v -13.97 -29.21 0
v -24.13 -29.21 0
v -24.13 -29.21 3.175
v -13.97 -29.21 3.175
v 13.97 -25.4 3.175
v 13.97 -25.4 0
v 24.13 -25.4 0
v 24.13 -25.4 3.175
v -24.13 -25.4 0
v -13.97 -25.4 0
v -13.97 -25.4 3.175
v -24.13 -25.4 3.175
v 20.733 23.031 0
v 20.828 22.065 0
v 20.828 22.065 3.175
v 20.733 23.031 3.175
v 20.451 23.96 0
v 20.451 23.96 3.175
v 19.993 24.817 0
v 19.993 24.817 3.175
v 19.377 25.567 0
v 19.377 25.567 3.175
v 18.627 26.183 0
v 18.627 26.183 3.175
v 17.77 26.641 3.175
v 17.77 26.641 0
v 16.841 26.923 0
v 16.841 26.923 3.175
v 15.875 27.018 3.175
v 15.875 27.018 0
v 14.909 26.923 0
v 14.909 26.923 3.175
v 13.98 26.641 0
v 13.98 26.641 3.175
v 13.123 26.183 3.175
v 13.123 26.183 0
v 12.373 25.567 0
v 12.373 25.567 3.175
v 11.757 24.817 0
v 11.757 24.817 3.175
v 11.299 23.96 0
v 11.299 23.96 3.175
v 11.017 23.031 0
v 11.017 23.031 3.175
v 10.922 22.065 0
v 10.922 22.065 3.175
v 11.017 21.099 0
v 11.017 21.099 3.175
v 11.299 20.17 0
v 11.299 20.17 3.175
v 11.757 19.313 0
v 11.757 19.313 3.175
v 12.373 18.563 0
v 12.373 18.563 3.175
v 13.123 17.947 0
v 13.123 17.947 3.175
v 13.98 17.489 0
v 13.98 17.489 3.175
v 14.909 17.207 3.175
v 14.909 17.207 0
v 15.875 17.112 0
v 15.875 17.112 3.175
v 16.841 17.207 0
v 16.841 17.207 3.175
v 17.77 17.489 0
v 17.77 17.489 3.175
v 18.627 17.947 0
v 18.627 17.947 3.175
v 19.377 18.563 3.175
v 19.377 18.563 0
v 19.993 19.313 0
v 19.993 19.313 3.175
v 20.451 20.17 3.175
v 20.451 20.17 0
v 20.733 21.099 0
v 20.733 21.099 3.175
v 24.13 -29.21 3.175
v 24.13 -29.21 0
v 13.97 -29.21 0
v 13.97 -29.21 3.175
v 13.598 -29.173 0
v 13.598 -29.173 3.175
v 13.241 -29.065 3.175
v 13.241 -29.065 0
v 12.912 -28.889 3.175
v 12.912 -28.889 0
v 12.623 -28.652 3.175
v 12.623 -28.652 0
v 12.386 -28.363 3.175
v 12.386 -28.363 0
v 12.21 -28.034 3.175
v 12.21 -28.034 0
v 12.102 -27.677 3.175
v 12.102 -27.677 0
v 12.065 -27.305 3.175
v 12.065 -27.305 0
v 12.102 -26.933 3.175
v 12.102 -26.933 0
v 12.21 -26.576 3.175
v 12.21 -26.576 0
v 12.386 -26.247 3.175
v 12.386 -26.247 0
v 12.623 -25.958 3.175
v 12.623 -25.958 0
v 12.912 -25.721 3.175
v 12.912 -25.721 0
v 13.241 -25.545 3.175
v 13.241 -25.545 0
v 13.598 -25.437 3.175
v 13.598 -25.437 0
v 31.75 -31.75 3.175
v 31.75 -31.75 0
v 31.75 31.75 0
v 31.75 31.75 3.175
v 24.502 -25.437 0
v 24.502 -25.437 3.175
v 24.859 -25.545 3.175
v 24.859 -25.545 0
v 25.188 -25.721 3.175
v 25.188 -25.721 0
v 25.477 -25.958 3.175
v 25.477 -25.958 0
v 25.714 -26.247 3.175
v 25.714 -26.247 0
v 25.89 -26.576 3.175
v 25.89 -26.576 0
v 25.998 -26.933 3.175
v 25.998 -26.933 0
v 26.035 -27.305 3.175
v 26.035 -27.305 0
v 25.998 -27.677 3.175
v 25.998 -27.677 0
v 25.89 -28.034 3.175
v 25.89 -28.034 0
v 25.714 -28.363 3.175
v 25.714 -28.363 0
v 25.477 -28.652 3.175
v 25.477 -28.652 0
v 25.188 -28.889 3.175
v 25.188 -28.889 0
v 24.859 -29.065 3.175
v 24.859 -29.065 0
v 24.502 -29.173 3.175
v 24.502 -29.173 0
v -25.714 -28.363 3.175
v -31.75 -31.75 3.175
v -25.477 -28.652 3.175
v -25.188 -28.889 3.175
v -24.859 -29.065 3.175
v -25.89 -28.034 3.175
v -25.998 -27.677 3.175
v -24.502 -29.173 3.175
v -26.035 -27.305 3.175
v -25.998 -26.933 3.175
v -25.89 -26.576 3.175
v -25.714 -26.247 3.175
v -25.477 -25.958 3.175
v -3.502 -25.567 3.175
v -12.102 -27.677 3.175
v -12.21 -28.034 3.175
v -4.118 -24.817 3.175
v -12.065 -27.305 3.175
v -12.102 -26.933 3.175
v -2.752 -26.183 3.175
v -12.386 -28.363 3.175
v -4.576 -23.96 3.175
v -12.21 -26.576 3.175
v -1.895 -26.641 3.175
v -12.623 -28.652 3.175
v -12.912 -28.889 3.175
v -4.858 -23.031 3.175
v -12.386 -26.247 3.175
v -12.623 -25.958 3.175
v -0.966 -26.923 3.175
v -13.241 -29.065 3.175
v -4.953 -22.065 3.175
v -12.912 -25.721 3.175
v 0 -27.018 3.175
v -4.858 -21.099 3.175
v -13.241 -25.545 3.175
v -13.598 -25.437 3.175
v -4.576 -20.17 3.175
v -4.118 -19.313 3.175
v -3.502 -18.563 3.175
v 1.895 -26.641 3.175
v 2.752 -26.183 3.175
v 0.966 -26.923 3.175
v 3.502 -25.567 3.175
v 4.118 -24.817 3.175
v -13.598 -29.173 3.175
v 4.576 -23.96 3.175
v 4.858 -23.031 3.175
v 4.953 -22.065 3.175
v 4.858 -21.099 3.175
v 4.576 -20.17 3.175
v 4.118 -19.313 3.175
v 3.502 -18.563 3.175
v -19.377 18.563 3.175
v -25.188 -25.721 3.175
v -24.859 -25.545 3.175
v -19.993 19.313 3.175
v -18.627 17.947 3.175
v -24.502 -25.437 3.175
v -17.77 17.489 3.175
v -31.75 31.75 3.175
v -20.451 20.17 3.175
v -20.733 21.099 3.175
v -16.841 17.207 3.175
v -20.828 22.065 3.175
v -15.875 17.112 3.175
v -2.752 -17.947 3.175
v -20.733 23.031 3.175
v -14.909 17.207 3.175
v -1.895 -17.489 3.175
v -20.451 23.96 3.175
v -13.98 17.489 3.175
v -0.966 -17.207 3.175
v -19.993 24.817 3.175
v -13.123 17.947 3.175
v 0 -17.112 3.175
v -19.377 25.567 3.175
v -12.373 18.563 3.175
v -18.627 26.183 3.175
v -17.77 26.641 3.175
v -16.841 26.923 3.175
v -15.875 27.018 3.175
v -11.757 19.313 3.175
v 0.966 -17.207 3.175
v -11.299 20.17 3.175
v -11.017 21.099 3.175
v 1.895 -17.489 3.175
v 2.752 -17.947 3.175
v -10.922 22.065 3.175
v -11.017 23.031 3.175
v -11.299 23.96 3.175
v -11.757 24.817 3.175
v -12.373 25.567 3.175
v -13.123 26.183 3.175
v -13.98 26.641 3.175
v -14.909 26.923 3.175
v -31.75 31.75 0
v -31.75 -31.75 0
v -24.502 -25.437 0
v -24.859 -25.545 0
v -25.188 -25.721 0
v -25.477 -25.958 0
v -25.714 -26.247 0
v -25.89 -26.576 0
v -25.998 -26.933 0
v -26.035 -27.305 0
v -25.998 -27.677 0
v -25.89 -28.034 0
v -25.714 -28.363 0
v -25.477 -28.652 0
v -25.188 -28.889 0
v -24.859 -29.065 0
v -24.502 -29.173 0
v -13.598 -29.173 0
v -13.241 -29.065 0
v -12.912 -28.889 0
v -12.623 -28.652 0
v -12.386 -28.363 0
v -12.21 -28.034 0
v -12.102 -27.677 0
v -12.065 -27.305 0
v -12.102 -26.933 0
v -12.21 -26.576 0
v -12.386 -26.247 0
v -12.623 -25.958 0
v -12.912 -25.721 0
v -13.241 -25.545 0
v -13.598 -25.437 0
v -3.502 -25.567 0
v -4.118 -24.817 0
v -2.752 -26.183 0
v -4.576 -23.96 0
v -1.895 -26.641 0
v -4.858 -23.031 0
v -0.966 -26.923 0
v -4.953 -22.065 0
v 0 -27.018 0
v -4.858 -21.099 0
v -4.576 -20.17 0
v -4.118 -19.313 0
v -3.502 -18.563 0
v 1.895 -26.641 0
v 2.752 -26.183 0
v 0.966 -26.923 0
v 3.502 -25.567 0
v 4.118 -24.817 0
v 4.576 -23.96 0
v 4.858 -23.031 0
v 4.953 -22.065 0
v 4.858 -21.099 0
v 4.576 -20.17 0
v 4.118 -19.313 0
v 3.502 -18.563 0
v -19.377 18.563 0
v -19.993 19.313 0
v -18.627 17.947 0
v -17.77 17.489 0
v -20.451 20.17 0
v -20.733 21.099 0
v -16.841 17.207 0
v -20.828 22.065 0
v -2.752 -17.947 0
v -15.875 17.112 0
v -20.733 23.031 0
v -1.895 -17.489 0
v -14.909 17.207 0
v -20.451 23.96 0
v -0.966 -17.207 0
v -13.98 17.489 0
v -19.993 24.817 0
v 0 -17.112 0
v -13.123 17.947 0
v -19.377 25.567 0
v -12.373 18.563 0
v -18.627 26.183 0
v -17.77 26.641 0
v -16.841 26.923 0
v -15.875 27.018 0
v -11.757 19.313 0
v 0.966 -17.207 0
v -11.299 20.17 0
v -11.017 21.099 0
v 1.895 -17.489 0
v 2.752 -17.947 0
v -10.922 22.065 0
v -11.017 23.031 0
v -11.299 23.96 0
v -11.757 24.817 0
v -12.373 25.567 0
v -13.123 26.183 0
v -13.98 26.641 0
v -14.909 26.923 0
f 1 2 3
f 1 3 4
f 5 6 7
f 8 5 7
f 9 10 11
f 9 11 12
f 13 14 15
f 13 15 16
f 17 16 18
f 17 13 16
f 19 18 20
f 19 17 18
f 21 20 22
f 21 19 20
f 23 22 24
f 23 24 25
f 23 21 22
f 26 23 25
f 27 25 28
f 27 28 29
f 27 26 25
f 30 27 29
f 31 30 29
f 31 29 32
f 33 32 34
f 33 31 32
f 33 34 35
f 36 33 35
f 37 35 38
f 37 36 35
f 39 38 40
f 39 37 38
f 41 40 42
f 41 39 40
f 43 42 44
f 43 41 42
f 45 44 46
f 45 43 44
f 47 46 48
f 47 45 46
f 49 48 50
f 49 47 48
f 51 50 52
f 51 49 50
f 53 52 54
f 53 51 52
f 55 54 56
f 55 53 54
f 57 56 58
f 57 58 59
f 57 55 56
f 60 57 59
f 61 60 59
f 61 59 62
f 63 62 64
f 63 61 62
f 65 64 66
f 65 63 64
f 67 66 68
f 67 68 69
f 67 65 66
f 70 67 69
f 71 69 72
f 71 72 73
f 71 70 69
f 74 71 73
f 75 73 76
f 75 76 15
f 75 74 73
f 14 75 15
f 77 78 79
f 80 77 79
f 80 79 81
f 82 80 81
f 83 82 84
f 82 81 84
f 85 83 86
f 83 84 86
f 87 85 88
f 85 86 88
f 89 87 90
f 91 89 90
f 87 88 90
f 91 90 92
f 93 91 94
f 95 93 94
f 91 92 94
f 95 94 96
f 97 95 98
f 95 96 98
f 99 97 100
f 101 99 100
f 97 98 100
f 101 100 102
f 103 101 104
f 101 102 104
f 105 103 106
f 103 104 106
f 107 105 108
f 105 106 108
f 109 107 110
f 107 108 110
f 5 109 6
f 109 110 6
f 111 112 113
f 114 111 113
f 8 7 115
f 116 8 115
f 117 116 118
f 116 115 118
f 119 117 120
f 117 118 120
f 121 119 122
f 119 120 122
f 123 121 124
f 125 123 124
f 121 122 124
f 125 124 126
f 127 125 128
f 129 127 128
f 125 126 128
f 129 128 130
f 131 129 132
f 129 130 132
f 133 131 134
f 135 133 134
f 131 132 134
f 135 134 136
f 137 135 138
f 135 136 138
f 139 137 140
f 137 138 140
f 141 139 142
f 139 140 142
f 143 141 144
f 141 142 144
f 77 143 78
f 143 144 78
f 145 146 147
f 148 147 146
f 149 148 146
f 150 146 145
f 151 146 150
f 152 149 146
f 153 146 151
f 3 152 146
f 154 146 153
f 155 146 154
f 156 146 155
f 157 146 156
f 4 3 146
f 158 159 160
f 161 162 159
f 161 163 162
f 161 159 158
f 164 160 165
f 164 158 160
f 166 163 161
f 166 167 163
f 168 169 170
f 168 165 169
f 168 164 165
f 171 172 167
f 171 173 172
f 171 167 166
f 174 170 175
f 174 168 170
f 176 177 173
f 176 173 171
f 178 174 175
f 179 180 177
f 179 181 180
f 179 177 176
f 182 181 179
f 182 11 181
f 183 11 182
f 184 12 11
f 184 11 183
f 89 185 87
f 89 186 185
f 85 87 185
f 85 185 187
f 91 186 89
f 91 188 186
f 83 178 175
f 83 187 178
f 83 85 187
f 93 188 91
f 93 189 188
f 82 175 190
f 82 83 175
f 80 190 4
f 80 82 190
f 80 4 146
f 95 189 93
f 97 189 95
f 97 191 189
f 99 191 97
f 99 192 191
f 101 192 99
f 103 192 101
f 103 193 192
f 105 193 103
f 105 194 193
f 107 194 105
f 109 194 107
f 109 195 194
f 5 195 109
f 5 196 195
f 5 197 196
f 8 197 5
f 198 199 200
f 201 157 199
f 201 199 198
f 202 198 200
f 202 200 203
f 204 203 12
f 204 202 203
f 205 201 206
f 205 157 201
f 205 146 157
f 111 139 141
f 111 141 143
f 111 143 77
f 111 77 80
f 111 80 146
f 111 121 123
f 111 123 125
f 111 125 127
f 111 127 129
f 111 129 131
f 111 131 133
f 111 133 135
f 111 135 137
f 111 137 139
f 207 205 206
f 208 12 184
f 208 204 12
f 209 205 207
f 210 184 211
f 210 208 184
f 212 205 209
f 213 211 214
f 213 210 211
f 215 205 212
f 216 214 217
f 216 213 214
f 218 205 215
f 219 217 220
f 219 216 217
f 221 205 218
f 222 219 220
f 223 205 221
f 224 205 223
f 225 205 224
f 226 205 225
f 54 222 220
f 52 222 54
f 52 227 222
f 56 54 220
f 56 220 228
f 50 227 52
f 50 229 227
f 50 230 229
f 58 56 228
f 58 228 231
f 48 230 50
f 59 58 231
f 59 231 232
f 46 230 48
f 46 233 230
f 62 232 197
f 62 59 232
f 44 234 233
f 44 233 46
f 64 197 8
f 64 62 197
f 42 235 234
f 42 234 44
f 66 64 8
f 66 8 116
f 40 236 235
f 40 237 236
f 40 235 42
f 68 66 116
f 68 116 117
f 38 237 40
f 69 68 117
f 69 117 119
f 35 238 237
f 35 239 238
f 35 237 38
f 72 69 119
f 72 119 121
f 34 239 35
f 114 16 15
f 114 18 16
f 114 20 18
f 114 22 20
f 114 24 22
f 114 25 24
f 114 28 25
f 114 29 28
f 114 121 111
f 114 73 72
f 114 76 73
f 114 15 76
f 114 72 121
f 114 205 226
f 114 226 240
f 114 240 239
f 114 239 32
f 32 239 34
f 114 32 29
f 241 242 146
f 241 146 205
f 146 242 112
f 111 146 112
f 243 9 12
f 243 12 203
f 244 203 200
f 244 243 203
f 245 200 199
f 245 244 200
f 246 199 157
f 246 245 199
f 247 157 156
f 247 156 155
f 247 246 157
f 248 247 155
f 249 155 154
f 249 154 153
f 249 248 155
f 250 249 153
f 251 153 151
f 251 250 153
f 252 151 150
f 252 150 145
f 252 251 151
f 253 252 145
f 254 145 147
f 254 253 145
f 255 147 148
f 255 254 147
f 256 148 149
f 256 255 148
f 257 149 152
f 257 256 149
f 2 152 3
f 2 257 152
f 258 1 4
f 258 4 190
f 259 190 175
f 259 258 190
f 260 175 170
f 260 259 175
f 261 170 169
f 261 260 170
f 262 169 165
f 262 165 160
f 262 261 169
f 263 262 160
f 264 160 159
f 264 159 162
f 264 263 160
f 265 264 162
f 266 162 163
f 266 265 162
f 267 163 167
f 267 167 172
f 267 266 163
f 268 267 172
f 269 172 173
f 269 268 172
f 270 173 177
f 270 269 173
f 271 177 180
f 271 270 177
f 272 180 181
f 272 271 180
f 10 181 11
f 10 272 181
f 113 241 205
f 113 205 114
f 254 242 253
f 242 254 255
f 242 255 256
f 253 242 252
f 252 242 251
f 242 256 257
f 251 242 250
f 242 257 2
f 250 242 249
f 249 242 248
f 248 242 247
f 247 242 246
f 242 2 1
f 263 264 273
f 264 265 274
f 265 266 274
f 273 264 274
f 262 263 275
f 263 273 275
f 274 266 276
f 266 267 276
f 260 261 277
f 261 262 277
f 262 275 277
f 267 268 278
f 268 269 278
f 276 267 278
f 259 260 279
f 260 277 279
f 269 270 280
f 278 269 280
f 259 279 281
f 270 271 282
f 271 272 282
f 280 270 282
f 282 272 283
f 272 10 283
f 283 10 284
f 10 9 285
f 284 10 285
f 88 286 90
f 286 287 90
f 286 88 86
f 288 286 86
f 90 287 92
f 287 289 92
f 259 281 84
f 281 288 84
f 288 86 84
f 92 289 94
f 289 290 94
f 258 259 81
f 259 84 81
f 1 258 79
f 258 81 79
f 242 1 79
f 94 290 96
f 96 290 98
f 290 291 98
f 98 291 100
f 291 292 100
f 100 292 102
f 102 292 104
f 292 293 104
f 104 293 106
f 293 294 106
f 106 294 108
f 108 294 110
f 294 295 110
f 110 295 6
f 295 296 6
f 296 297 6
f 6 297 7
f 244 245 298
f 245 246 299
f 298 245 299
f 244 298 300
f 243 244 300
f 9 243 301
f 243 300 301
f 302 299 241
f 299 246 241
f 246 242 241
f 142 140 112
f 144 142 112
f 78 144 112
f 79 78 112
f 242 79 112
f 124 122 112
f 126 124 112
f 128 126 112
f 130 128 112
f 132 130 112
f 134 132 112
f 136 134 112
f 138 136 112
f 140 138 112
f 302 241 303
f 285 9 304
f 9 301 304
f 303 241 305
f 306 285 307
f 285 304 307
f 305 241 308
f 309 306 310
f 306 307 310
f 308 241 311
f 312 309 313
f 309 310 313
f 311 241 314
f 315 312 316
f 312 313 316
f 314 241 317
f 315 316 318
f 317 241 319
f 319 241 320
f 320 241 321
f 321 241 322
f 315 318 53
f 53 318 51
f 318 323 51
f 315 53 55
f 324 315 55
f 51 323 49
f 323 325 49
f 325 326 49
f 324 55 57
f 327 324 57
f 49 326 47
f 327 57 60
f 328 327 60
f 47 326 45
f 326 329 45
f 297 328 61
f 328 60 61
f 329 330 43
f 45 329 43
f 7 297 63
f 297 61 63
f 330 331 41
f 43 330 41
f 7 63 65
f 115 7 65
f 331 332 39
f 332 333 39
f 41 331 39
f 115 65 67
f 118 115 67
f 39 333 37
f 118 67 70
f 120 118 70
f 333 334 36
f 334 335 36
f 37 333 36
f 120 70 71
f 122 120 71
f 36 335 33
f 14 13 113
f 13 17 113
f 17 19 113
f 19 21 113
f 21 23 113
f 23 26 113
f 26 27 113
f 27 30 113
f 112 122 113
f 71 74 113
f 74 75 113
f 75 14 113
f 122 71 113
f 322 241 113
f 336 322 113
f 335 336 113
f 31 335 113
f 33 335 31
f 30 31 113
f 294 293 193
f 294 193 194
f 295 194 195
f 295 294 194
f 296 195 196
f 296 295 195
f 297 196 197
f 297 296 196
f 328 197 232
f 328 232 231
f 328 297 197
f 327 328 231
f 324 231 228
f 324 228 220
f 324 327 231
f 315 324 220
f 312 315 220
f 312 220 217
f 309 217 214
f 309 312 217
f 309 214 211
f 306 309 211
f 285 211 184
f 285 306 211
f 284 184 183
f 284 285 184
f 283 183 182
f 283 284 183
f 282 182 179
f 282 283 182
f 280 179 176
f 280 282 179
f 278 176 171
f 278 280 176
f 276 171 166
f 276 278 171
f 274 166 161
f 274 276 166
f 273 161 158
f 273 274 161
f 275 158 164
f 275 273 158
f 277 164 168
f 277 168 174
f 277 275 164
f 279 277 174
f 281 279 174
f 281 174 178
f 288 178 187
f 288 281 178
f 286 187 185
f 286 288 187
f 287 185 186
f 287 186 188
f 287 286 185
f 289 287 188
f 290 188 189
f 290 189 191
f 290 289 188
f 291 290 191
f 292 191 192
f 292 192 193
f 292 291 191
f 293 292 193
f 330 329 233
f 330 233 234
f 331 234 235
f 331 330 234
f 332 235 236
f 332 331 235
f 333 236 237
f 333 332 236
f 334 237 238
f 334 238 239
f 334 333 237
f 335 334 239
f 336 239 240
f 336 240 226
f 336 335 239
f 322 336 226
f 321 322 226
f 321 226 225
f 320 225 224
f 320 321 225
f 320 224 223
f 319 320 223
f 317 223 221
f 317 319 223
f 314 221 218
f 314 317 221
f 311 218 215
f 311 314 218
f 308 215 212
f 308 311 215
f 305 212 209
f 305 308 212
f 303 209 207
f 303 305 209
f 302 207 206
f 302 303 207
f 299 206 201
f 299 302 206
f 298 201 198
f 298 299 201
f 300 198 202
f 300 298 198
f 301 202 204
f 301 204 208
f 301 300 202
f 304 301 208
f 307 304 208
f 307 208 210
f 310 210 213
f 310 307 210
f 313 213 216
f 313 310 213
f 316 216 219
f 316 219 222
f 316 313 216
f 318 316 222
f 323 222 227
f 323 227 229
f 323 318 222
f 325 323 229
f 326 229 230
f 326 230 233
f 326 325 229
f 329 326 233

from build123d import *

# Parameters (mm, degrees)
SKETCH1_W           = 63.5
SKETCH1_H           = 63.5
SKETCH1_R           = 4.953
BOSS_EXTRUDE1_DEPTH = 3.175


with BuildPart() as part:
    # Sketch1 → Boss-Extrude1 (new body)
    with BuildSketch(Plane.XY):
        Rectangle(SKETCH1_W, SKETCH1_H)
        with Locations((-15.875, 22.06498)):
            Circle(SKETCH1_R, mode=Mode.SUBTRACT)
        with Locations((15.875, 22.06498)):
            Circle(SKETCH1_R, mode=Mode.SUBTRACT)
        with Locations((0, -22.06498)):
            Circle(SKETCH1_R, mode=Mode.SUBTRACT)
        with BuildLine():
            Line((13.97, -25.4), (24.13, -25.4))
            ThreePointArc((24.13, -25.4), (26.035, -27.305), (24.13, -29.21))
            Line((24.13, -29.21), (13.97, -29.21))
            ThreePointArc((13.97, -29.21), (12.065, -27.305), (13.97, -25.4))
        make_face(mode=Mode.SUBTRACT)
        with BuildLine():
            Line((-13.97, -25.4), (-24.13, -25.4))
            ThreePointArc((-24.13, -25.4), (-26.035, -27.305), (-24.13, -29.21))
            Line((-24.13, -29.21), (-13.97, -29.21))
            ThreePointArc((-13.97, -29.21), (-12.065, -27.305), (-13.97, -25.4))
        make_face(mode=Mode.SUBTRACT)
    extrude(amount=BOSS_EXTRUDE1_DEPTH)


solid = part.part
